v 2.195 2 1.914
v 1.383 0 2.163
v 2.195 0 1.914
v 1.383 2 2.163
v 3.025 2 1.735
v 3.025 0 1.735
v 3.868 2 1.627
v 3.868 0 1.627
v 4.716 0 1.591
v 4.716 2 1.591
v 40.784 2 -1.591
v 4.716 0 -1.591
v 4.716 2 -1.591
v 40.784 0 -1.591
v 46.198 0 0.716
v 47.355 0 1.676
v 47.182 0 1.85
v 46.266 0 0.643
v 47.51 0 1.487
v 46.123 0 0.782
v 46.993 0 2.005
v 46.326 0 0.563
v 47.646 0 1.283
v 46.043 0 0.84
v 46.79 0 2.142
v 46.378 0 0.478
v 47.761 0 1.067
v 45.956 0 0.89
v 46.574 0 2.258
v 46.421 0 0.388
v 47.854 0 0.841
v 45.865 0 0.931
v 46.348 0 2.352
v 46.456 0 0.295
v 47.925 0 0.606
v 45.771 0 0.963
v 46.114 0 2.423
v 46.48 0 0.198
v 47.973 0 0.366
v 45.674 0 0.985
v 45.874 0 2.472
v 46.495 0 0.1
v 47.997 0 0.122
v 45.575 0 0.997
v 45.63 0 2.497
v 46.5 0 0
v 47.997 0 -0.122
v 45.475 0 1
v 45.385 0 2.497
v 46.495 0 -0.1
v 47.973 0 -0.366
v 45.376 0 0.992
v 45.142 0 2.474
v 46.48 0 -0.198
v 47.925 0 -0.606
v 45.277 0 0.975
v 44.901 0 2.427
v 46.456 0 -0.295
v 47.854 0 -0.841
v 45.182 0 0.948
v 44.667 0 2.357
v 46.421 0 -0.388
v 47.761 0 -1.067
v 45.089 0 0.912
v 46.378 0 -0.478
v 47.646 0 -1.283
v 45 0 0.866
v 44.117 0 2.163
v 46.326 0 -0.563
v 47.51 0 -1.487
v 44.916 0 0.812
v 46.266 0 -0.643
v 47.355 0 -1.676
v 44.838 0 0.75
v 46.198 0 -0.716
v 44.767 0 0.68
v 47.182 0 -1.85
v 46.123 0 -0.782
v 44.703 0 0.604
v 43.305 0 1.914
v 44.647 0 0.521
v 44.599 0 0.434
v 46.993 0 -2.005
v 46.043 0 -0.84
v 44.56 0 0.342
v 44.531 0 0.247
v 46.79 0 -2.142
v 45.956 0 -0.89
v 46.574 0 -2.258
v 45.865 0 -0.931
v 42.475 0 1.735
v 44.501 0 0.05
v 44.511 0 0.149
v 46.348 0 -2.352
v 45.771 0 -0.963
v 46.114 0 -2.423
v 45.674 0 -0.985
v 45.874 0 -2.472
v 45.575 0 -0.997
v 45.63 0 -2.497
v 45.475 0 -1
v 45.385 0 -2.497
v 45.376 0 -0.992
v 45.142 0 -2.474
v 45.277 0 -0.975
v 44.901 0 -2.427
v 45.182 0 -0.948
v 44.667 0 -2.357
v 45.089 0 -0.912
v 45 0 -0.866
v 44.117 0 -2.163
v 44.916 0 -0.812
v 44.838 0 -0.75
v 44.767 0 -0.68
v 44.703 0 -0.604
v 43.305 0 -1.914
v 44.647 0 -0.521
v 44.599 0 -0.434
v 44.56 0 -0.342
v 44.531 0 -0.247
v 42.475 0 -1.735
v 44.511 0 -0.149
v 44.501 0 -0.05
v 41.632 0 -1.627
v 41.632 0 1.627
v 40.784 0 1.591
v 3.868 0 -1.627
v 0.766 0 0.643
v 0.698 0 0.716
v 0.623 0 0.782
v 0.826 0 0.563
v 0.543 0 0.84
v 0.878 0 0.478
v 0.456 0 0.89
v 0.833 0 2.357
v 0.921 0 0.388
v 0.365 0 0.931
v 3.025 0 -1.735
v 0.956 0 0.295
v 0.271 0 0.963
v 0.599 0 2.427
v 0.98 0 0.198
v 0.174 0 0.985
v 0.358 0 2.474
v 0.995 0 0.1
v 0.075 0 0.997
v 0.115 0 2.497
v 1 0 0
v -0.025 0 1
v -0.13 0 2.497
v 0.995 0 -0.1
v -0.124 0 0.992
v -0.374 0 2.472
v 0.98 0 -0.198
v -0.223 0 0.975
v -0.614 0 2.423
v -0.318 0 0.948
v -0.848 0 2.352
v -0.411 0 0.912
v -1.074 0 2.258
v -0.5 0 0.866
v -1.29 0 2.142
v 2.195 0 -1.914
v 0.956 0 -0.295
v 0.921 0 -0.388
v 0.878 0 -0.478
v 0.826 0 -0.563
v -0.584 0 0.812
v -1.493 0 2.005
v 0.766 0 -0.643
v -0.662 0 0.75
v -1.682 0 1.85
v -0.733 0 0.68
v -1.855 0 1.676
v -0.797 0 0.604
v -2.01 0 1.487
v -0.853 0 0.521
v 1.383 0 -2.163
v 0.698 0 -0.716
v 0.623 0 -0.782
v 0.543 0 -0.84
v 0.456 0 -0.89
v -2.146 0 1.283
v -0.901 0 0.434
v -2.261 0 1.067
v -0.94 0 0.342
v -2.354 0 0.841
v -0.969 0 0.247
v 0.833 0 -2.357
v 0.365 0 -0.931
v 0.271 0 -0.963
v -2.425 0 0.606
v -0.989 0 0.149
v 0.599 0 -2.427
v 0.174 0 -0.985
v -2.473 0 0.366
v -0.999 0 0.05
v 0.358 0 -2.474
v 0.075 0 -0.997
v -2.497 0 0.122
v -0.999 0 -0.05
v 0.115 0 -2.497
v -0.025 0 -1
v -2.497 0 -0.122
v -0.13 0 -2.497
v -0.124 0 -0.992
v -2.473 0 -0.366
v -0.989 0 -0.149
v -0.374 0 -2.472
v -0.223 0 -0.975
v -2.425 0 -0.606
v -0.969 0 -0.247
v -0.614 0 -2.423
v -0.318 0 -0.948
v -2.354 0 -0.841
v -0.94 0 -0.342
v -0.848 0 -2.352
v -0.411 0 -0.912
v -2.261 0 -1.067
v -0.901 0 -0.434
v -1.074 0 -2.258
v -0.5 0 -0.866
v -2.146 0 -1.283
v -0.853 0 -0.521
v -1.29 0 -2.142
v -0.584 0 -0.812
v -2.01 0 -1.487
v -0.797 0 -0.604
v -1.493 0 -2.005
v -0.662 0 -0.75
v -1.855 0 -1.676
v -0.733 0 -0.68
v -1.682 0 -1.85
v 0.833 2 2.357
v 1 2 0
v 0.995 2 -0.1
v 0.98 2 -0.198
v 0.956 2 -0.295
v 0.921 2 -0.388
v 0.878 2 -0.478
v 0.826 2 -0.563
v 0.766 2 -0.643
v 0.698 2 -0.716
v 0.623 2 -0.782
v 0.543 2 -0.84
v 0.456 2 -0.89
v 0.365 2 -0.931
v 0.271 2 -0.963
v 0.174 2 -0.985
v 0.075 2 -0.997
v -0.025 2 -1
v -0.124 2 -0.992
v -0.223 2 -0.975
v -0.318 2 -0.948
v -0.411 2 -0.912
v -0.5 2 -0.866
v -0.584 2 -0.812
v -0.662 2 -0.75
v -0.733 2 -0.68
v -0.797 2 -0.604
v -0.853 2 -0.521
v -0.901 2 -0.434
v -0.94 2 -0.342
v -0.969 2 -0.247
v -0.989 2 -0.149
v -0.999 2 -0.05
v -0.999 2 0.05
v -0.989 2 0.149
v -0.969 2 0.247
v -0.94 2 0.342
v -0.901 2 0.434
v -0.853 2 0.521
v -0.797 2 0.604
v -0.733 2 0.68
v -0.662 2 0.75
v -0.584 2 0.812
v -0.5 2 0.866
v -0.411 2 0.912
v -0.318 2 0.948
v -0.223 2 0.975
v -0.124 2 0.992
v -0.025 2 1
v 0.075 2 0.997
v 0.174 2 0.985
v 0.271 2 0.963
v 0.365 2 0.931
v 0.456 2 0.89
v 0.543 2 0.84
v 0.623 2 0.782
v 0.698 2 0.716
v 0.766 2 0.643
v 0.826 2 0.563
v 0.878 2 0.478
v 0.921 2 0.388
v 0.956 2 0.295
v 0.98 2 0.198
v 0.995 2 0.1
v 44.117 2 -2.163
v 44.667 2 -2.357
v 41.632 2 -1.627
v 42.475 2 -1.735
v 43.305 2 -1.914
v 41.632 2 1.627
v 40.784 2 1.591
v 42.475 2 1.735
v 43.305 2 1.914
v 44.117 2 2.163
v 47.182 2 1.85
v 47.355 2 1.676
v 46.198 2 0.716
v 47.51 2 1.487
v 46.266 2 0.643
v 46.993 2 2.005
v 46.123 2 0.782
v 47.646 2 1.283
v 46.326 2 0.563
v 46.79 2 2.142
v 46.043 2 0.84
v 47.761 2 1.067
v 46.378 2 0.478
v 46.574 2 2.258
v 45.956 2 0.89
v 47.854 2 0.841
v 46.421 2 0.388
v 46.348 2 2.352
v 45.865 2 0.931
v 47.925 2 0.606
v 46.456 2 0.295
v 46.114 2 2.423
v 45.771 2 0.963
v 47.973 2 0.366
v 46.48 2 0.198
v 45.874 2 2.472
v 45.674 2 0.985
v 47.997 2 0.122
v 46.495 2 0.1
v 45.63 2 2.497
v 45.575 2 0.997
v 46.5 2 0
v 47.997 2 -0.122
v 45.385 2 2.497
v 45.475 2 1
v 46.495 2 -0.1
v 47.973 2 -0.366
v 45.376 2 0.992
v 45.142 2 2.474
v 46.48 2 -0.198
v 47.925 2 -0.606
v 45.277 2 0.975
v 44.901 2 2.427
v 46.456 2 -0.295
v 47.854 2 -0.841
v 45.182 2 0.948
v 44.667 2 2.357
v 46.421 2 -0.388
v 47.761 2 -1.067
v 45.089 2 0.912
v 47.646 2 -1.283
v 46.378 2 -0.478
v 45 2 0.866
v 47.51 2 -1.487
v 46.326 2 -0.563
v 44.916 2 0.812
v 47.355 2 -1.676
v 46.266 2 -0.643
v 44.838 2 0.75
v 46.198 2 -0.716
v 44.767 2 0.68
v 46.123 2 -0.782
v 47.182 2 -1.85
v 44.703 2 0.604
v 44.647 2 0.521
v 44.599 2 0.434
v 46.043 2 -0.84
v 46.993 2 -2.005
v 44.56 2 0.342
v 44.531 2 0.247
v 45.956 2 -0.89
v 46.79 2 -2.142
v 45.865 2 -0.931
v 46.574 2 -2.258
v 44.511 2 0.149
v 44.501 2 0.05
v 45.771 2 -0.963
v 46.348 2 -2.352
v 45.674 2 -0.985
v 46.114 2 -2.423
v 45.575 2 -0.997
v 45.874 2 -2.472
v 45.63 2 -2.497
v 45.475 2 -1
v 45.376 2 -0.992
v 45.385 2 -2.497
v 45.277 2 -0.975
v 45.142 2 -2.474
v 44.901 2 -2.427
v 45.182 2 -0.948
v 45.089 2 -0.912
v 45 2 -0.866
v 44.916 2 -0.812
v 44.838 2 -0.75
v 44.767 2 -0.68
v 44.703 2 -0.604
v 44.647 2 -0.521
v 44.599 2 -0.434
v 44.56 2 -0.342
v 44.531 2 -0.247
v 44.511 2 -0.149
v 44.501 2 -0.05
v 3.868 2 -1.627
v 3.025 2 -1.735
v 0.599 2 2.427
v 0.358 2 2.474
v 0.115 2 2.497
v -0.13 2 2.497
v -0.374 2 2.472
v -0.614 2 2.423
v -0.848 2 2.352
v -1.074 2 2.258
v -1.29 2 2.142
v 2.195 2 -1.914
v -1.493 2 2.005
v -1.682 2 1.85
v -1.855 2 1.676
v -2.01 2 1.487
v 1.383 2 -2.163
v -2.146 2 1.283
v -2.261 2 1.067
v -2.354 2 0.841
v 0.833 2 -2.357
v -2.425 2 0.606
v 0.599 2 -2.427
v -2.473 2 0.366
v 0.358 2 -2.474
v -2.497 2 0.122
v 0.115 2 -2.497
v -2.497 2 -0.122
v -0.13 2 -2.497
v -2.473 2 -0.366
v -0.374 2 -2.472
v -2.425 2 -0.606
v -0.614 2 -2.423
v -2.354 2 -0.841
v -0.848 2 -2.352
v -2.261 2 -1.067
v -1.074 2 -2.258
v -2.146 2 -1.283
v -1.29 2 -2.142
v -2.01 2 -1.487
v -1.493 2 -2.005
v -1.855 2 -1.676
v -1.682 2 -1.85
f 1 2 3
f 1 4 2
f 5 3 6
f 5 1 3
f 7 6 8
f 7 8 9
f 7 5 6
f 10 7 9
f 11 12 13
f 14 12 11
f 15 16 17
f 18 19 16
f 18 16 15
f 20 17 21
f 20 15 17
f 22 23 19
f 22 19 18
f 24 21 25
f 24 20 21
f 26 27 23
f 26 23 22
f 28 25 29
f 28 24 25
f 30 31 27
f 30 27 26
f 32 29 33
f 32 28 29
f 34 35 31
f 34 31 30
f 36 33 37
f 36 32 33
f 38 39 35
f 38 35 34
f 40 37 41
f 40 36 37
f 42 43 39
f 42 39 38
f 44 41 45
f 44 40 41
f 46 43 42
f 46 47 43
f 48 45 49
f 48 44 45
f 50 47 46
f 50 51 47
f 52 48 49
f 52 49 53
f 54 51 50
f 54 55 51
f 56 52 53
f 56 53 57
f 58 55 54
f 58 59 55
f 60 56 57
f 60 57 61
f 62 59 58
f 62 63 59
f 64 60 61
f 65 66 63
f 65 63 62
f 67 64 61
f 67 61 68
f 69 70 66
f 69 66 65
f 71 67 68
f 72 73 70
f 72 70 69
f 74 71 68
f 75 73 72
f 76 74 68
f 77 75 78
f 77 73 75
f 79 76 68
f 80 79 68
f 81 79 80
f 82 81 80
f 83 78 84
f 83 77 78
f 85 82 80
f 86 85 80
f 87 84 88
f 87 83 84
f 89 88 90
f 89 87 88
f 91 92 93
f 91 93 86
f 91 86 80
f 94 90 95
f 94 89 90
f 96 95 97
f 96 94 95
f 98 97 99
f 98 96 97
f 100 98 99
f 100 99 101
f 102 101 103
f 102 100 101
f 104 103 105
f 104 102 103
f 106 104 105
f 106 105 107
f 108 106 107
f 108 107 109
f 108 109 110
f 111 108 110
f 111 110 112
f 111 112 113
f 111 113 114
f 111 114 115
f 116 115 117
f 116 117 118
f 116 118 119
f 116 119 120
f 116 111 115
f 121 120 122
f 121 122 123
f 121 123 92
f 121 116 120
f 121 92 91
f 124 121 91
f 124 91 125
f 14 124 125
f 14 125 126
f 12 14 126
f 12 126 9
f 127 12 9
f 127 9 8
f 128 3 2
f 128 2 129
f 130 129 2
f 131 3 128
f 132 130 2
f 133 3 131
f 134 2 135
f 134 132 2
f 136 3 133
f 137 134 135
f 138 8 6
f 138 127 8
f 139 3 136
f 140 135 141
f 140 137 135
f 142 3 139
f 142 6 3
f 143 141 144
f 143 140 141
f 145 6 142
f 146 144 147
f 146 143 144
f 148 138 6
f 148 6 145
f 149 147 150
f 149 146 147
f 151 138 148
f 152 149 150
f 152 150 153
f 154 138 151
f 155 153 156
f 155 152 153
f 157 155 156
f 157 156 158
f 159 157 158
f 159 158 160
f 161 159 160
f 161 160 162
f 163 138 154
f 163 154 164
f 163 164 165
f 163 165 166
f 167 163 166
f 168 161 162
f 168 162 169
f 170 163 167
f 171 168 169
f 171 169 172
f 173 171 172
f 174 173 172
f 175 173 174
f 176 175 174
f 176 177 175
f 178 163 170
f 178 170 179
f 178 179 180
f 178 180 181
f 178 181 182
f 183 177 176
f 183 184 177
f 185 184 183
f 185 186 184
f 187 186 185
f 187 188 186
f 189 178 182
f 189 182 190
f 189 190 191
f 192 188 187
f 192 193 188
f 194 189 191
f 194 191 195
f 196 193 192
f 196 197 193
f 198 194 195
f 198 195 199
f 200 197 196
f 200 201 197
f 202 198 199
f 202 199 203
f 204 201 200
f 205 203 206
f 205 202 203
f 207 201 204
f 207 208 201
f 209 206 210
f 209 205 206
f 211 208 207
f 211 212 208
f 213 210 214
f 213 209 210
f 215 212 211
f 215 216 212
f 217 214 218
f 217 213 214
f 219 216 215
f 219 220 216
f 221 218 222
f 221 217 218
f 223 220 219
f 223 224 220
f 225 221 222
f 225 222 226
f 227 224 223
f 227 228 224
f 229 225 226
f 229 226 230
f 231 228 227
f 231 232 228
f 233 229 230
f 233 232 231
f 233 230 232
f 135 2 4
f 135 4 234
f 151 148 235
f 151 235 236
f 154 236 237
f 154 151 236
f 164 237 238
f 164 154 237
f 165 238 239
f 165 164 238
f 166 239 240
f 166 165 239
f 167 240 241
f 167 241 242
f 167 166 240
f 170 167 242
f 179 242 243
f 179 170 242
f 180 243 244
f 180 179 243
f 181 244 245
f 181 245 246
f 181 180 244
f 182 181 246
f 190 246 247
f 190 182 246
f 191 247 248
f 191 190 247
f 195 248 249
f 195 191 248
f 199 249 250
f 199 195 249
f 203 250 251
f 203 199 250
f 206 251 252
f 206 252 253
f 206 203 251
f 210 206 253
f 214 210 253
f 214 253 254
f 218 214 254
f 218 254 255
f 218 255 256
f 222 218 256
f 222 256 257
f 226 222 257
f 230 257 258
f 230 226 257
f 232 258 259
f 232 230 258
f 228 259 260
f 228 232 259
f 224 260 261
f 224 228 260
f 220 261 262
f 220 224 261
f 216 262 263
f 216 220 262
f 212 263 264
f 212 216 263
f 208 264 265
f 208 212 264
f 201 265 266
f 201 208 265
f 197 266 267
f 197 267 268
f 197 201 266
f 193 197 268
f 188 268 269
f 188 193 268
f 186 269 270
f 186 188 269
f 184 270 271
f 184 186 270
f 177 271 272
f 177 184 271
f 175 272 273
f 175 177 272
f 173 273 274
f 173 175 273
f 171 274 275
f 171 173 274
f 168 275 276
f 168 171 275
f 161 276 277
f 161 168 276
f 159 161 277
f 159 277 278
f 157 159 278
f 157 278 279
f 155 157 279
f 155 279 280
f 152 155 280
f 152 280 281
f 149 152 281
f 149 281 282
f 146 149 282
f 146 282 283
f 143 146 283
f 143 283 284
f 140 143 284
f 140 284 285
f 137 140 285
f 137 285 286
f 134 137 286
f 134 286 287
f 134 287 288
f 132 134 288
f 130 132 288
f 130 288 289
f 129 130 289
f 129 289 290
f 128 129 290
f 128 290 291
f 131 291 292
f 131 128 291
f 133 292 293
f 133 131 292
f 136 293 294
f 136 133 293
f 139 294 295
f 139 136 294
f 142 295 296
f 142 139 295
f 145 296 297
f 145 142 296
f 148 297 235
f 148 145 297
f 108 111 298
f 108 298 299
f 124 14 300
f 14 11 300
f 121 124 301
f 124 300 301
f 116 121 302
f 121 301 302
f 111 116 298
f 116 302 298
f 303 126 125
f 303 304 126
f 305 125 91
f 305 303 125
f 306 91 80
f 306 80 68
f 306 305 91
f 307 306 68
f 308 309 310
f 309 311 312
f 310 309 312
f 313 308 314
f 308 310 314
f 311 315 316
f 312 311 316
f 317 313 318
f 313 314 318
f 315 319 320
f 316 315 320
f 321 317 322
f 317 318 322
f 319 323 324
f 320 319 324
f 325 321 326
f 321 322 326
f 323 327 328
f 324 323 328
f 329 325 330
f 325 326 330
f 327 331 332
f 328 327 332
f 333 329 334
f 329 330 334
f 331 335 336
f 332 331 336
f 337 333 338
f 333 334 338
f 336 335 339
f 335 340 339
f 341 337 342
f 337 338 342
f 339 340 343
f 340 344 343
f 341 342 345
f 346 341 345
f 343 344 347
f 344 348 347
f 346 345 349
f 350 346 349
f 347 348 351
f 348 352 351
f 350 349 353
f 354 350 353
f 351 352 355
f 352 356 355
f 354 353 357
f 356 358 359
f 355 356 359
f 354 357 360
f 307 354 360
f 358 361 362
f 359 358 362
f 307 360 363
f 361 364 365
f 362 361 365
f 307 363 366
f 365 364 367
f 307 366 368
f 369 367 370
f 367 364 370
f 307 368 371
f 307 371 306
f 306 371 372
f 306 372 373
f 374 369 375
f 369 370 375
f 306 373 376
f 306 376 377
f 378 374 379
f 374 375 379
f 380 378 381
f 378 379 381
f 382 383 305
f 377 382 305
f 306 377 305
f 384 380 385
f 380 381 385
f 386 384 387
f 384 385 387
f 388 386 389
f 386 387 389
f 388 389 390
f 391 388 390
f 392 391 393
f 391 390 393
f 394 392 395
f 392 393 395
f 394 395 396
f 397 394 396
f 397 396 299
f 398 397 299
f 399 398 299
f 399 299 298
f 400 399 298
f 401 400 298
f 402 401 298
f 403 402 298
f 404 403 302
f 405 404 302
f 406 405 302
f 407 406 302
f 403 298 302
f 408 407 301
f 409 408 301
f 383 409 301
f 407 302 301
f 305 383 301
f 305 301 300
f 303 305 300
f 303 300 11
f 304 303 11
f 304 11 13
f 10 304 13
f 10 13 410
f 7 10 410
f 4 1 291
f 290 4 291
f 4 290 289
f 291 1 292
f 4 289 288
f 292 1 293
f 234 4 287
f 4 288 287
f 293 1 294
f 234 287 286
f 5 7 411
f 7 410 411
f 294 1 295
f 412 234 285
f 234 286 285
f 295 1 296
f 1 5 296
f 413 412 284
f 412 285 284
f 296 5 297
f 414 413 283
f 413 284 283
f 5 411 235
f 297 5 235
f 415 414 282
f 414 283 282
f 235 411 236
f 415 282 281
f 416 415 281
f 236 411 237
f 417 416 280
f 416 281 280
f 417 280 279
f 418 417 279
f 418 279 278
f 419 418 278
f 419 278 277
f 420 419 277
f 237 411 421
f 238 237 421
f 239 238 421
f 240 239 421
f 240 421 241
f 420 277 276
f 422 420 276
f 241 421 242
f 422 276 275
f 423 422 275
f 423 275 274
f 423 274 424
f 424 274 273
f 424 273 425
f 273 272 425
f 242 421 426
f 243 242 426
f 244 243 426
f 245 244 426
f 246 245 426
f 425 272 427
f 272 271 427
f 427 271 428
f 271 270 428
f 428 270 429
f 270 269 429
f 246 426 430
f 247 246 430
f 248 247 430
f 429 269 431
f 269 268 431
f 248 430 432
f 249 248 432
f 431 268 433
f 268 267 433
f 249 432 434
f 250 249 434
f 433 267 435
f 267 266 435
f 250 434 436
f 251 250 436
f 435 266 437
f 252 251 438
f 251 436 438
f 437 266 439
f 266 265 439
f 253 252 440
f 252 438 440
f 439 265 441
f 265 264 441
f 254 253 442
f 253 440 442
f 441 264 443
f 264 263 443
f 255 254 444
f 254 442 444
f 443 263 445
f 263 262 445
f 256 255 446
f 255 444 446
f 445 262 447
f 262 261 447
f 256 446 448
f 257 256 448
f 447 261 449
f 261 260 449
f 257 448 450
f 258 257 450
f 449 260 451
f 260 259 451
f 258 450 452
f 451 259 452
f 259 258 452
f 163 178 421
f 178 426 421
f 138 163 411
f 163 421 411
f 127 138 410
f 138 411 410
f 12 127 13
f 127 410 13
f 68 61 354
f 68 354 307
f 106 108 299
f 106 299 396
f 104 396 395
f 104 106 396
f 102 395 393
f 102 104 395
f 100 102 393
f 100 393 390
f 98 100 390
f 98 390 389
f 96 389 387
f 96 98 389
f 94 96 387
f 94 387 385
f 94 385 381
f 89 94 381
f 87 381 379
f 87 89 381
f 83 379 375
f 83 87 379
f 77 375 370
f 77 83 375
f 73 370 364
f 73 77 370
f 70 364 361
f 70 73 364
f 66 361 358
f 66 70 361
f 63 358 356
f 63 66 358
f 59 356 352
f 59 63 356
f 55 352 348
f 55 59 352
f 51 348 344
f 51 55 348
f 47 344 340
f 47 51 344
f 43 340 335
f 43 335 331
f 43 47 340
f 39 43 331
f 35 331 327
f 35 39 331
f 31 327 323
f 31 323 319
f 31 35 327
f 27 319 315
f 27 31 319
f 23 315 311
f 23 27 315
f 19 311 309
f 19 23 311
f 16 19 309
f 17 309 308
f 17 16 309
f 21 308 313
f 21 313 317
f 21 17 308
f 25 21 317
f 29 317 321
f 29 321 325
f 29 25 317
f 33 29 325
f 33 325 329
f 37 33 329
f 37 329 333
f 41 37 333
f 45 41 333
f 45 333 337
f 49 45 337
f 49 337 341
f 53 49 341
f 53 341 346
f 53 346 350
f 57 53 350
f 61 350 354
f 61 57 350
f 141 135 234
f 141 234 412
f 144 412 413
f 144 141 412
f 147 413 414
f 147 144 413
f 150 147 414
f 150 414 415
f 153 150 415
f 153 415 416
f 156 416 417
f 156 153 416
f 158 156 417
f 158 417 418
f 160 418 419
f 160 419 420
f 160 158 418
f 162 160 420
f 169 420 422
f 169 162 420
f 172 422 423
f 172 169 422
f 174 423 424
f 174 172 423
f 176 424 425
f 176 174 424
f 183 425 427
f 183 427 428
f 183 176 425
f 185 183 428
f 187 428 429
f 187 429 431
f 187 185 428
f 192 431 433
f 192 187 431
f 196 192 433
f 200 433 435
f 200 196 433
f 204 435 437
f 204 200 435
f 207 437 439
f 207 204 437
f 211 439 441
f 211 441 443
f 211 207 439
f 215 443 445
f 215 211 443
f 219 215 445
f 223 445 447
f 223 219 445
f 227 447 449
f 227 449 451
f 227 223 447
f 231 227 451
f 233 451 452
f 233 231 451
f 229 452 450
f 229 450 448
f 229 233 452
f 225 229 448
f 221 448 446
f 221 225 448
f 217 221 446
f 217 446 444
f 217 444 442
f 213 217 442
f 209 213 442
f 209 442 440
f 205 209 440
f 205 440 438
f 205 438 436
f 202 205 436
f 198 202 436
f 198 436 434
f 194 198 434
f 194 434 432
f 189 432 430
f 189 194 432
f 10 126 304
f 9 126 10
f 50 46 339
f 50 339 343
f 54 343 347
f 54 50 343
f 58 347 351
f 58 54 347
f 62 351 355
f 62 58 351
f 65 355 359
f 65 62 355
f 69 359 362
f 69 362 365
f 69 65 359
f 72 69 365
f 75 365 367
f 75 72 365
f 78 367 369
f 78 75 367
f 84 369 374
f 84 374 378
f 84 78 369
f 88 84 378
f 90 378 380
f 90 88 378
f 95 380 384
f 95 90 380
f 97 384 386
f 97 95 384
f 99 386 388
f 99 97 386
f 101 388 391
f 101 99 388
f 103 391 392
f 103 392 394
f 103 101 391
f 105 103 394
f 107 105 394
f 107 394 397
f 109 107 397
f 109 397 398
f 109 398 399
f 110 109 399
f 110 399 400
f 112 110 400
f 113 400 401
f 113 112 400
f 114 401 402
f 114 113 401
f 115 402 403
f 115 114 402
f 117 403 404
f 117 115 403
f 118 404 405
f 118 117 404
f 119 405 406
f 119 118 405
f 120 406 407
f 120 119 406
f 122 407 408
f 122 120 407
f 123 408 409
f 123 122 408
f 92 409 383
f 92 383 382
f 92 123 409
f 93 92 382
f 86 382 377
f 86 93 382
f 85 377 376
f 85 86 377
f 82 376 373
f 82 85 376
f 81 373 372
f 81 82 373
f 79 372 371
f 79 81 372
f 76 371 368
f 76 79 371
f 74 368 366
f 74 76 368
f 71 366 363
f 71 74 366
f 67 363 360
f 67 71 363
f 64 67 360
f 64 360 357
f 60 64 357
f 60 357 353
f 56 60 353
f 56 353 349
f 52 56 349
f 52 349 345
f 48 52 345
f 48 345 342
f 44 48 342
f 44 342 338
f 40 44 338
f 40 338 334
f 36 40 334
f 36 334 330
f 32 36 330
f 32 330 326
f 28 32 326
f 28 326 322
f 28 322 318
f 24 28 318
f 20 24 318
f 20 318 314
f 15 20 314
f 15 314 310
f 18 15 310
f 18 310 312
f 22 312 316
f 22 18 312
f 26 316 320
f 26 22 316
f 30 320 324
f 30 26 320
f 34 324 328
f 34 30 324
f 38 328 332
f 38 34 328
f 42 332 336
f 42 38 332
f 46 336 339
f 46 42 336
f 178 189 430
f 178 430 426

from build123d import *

# Parameters (mm, degrees)
SKETCH1_R           = 1
BOSS_EXTRUDE2_DEPTH = 2
FILLET2_R           = 10


with BuildPart() as part:
    # Sketch1 → Boss-Extrude2 (new body)
    with BuildSketch(Plane(origin=(0, 0, 0), x_dir=(1, 0, 0), z_dir=(0, 1, 0))):
        with BuildLine():
            Line((0.833333333, 2.357022604), (3.0003558, 1.590864463))
            Line((3.0003558, 1.590864463), (42.4996442, 1.590864463))
            Line((42.4996442, 1.590864463), (44.666666667, 2.357022604))
            ThreePointArc((44.666666667, 2.357022604), (48, 0), (44.666666667, -2.357022604))
            Line((44.666666667, -2.357022604), (42.4996442, -1.590864463))
            Line((42.4996442, -1.590864463), (3.0003558, -1.590864463))
            Line((3.0003558, -1.590864463), (0.833333333, -2.357022604))
            ThreePointArc((0.833333333, -2.357022604), (-2.5, 0), (0.833333333, 2.357022604))
        make_face()
        Circle(SKETCH1_R, mode=Mode.SUBTRACT)
        with Locations((45.5, 0)):
            Circle(SKETCH1_R, mode=Mode.SUBTRACT)
    extrude(amount=BOSS_EXTRUDE2_DEPTH)

    # Fillet2
    fillet2_edges = [part.edges().sort_by_distance(p)[0] for p in [
        (42.4996442, 1, -1.590864463),
        (42.4996442, 1, 1.590864463),
        (3.0003558, 1, 1.590864463),
        (3.0003558, 1, -1.590864463),
    ]]
    fillet(fillet2_edges, radius=FILLET2_R)


solid = part.part
